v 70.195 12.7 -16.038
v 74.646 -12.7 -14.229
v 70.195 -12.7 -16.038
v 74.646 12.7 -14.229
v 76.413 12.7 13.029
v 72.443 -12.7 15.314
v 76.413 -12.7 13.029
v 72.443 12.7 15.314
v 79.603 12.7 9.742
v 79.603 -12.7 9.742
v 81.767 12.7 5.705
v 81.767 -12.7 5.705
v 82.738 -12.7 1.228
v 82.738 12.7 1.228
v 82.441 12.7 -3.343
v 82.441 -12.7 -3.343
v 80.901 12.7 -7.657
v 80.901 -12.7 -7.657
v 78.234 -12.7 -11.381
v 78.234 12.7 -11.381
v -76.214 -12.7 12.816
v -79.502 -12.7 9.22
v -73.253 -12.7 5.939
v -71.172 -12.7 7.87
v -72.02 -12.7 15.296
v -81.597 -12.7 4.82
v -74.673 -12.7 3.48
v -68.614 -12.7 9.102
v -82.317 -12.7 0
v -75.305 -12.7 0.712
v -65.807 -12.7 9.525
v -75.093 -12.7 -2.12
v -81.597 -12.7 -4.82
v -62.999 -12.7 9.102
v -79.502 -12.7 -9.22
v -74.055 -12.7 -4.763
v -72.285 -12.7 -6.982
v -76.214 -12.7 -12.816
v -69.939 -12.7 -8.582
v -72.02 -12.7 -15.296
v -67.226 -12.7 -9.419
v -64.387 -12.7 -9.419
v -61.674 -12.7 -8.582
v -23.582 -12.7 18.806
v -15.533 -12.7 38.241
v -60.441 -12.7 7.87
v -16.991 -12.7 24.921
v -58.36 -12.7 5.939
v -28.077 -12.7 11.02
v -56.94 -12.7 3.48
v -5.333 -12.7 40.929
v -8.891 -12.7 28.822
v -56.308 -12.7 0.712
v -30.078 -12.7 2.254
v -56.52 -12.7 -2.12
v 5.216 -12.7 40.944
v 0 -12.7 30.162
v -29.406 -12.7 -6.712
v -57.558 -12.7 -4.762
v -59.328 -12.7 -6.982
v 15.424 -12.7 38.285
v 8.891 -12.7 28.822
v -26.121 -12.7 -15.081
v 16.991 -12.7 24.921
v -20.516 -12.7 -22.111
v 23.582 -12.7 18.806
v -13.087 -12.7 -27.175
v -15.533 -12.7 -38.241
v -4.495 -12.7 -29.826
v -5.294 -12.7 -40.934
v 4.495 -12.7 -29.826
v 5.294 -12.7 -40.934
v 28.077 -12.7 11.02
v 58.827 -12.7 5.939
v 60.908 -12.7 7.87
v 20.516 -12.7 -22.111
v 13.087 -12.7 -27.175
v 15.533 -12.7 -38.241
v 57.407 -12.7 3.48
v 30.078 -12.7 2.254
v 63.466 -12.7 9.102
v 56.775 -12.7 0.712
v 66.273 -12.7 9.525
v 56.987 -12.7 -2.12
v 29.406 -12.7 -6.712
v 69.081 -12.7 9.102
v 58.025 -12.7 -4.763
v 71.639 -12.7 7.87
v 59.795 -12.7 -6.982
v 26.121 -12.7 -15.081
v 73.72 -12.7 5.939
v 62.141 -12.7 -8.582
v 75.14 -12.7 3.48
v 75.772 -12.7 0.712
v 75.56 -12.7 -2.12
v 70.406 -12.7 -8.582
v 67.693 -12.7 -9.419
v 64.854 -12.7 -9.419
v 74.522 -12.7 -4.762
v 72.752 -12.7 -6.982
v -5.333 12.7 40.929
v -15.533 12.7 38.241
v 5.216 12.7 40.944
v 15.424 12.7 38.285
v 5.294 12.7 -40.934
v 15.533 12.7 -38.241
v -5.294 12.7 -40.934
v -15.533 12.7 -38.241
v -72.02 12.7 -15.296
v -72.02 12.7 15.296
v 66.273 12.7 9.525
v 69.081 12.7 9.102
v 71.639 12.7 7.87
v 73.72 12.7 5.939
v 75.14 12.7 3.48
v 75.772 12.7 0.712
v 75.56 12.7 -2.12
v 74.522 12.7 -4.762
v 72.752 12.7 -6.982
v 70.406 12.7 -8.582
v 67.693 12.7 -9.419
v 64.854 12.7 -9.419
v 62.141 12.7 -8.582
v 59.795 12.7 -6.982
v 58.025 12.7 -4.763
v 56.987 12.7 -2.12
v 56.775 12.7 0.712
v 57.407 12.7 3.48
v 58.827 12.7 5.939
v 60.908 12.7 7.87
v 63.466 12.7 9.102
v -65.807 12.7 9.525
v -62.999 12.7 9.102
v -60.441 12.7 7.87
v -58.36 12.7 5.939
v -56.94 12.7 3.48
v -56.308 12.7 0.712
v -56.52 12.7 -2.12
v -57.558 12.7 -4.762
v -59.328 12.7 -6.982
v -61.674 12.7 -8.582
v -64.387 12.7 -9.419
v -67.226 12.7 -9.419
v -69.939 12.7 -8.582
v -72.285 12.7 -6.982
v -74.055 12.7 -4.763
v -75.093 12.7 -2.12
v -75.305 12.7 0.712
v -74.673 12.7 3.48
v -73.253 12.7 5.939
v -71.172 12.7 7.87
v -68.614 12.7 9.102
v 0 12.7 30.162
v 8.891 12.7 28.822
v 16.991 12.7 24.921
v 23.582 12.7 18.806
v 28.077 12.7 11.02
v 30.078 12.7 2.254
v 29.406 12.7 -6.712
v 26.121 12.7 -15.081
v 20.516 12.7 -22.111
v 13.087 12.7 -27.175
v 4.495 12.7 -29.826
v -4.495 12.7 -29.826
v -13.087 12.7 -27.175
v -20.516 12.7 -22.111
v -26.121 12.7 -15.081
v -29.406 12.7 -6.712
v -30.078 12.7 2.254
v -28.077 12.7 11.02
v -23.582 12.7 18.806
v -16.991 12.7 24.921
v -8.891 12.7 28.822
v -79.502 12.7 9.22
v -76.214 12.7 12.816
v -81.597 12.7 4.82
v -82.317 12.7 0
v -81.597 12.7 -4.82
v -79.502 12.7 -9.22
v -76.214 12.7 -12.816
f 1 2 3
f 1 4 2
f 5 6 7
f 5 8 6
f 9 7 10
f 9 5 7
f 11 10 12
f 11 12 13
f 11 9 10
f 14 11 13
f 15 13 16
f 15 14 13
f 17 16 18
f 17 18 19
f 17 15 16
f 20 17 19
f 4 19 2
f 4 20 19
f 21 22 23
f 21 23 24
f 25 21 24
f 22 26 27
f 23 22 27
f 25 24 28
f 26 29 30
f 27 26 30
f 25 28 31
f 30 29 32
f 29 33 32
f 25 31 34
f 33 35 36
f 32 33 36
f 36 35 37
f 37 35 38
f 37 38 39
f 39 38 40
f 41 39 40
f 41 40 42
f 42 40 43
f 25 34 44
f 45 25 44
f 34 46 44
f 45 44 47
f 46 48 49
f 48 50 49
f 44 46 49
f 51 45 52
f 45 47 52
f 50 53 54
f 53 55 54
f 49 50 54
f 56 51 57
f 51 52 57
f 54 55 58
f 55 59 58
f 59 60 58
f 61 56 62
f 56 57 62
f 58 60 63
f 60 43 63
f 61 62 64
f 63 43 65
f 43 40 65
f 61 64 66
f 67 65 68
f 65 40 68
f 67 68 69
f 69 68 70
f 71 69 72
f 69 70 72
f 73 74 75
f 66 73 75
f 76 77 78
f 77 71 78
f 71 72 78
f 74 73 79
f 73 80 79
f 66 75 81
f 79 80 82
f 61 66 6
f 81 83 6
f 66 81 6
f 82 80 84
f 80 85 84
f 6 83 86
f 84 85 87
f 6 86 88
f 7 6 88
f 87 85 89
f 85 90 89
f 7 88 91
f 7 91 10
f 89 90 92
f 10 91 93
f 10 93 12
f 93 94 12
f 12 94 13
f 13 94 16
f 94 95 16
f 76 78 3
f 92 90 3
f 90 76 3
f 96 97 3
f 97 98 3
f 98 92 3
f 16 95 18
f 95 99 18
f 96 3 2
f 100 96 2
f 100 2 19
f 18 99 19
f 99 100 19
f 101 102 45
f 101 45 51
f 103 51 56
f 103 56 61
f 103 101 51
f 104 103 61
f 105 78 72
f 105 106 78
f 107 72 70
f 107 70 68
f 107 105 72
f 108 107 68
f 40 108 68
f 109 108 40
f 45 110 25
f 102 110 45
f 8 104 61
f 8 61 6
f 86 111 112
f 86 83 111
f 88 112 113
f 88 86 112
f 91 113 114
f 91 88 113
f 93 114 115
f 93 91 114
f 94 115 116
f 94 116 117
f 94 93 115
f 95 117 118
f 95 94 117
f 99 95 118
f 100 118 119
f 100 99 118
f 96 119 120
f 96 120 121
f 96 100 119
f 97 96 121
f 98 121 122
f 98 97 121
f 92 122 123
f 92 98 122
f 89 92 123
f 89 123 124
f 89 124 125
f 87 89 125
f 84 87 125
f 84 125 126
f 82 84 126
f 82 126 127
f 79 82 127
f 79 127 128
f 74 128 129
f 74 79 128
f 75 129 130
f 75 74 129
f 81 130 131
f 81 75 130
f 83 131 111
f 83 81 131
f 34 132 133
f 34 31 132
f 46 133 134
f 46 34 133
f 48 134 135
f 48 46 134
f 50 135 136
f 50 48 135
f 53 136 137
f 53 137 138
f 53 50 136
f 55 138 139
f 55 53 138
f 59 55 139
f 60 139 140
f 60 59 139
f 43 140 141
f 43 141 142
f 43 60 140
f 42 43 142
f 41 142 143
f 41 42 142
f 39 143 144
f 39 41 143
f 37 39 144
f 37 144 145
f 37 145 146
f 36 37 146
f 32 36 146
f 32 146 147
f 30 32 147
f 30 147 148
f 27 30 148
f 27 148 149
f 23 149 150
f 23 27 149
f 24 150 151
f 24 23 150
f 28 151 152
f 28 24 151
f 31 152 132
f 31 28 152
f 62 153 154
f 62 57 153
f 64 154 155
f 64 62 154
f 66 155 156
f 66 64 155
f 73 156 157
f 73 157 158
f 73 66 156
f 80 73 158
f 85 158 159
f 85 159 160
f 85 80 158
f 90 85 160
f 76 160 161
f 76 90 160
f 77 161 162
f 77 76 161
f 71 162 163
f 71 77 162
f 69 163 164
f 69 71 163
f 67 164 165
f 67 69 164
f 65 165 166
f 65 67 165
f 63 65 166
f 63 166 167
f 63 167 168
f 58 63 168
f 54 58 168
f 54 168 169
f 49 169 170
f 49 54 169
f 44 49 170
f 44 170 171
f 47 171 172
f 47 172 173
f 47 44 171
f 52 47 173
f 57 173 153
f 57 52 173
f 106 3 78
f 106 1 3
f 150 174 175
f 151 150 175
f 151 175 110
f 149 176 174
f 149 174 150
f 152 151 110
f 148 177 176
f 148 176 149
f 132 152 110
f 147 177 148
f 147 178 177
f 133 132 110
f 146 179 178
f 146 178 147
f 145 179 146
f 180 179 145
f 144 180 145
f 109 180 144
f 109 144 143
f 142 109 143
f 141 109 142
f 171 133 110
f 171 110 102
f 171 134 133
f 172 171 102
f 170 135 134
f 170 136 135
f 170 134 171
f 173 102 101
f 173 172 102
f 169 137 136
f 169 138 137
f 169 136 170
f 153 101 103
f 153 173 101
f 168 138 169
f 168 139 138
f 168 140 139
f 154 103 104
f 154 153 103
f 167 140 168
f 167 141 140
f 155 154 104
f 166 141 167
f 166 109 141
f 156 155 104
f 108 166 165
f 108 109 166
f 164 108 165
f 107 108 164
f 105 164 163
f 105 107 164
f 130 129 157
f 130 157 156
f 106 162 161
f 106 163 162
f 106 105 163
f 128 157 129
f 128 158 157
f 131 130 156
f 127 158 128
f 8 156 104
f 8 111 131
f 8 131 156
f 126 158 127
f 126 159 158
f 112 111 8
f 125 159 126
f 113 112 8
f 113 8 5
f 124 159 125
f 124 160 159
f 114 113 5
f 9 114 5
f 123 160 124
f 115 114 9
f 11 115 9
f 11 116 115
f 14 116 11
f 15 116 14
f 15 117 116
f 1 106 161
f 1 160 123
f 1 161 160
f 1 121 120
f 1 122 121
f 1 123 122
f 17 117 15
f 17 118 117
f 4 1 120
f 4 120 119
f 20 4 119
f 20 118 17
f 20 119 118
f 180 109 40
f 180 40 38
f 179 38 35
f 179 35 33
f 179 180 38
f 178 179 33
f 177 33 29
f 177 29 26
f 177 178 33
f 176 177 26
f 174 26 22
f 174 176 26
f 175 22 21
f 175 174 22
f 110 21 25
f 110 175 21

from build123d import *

# Parameters (mm, degrees)
SKETCH1_R           = 9.525
SKETCH1_R_2         = 30.1625
BOSS_EXTRUDE1_DEPTH = 12.7


with BuildPart() as part:
    # Sketch1 → Boss-Extrude1 (new, symmetric)
    with BuildSketch(Plane(origin=(0, 0, 0), x_dir=(1, 0, 0), z_dir=(0, 1, 0))):
        with BuildLine():
            Line((-15.533043632, 38.240687501), (-72.019726416, 15.296275))
            ThreePointArc((-72.019726416, 15.296275), (-82.316508964, 0), (-72.019726416, -15.296275))
            Line((-72.019726416, -15.296275), (-15.533043632, -38.240687501))
            ThreePointArc((-15.533043632, -38.240687501), (-0.059033228, -41.274957784), (15.423593341, -38.28496302))
            Line((15.423593341, -38.28496302), (72.442928372, -15.313985208))
            ThreePointArc((72.442928372, -15.313985208), (82.737758003, -1.228011915), (74.64645973, 14.229318158))
            Line((74.64645973, 14.229318158), (70.194684869, 16.037591432))
            Line((70.194684869, 16.037591432), (15.533043632, 38.240687501))
            ThreePointArc((15.533043632, 38.240687501), (0, 41.275), (-15.533043632, 38.240687501))
        make_face()
        with Locations((-65.806508964, 0)):
            Circle(SKETCH1_R, mode=Mode.SUBTRACT)
        Circle(SKETCH1_R_2, mode=Mode.SUBTRACT)
        with Locations((66.273491036, 0)):
            Circle(SKETCH1_R, mode=Mode.SUBTRACT)
    extrude(amount=BOSS_EXTRUDE1_DEPTH, both=True)


solid = part.part
